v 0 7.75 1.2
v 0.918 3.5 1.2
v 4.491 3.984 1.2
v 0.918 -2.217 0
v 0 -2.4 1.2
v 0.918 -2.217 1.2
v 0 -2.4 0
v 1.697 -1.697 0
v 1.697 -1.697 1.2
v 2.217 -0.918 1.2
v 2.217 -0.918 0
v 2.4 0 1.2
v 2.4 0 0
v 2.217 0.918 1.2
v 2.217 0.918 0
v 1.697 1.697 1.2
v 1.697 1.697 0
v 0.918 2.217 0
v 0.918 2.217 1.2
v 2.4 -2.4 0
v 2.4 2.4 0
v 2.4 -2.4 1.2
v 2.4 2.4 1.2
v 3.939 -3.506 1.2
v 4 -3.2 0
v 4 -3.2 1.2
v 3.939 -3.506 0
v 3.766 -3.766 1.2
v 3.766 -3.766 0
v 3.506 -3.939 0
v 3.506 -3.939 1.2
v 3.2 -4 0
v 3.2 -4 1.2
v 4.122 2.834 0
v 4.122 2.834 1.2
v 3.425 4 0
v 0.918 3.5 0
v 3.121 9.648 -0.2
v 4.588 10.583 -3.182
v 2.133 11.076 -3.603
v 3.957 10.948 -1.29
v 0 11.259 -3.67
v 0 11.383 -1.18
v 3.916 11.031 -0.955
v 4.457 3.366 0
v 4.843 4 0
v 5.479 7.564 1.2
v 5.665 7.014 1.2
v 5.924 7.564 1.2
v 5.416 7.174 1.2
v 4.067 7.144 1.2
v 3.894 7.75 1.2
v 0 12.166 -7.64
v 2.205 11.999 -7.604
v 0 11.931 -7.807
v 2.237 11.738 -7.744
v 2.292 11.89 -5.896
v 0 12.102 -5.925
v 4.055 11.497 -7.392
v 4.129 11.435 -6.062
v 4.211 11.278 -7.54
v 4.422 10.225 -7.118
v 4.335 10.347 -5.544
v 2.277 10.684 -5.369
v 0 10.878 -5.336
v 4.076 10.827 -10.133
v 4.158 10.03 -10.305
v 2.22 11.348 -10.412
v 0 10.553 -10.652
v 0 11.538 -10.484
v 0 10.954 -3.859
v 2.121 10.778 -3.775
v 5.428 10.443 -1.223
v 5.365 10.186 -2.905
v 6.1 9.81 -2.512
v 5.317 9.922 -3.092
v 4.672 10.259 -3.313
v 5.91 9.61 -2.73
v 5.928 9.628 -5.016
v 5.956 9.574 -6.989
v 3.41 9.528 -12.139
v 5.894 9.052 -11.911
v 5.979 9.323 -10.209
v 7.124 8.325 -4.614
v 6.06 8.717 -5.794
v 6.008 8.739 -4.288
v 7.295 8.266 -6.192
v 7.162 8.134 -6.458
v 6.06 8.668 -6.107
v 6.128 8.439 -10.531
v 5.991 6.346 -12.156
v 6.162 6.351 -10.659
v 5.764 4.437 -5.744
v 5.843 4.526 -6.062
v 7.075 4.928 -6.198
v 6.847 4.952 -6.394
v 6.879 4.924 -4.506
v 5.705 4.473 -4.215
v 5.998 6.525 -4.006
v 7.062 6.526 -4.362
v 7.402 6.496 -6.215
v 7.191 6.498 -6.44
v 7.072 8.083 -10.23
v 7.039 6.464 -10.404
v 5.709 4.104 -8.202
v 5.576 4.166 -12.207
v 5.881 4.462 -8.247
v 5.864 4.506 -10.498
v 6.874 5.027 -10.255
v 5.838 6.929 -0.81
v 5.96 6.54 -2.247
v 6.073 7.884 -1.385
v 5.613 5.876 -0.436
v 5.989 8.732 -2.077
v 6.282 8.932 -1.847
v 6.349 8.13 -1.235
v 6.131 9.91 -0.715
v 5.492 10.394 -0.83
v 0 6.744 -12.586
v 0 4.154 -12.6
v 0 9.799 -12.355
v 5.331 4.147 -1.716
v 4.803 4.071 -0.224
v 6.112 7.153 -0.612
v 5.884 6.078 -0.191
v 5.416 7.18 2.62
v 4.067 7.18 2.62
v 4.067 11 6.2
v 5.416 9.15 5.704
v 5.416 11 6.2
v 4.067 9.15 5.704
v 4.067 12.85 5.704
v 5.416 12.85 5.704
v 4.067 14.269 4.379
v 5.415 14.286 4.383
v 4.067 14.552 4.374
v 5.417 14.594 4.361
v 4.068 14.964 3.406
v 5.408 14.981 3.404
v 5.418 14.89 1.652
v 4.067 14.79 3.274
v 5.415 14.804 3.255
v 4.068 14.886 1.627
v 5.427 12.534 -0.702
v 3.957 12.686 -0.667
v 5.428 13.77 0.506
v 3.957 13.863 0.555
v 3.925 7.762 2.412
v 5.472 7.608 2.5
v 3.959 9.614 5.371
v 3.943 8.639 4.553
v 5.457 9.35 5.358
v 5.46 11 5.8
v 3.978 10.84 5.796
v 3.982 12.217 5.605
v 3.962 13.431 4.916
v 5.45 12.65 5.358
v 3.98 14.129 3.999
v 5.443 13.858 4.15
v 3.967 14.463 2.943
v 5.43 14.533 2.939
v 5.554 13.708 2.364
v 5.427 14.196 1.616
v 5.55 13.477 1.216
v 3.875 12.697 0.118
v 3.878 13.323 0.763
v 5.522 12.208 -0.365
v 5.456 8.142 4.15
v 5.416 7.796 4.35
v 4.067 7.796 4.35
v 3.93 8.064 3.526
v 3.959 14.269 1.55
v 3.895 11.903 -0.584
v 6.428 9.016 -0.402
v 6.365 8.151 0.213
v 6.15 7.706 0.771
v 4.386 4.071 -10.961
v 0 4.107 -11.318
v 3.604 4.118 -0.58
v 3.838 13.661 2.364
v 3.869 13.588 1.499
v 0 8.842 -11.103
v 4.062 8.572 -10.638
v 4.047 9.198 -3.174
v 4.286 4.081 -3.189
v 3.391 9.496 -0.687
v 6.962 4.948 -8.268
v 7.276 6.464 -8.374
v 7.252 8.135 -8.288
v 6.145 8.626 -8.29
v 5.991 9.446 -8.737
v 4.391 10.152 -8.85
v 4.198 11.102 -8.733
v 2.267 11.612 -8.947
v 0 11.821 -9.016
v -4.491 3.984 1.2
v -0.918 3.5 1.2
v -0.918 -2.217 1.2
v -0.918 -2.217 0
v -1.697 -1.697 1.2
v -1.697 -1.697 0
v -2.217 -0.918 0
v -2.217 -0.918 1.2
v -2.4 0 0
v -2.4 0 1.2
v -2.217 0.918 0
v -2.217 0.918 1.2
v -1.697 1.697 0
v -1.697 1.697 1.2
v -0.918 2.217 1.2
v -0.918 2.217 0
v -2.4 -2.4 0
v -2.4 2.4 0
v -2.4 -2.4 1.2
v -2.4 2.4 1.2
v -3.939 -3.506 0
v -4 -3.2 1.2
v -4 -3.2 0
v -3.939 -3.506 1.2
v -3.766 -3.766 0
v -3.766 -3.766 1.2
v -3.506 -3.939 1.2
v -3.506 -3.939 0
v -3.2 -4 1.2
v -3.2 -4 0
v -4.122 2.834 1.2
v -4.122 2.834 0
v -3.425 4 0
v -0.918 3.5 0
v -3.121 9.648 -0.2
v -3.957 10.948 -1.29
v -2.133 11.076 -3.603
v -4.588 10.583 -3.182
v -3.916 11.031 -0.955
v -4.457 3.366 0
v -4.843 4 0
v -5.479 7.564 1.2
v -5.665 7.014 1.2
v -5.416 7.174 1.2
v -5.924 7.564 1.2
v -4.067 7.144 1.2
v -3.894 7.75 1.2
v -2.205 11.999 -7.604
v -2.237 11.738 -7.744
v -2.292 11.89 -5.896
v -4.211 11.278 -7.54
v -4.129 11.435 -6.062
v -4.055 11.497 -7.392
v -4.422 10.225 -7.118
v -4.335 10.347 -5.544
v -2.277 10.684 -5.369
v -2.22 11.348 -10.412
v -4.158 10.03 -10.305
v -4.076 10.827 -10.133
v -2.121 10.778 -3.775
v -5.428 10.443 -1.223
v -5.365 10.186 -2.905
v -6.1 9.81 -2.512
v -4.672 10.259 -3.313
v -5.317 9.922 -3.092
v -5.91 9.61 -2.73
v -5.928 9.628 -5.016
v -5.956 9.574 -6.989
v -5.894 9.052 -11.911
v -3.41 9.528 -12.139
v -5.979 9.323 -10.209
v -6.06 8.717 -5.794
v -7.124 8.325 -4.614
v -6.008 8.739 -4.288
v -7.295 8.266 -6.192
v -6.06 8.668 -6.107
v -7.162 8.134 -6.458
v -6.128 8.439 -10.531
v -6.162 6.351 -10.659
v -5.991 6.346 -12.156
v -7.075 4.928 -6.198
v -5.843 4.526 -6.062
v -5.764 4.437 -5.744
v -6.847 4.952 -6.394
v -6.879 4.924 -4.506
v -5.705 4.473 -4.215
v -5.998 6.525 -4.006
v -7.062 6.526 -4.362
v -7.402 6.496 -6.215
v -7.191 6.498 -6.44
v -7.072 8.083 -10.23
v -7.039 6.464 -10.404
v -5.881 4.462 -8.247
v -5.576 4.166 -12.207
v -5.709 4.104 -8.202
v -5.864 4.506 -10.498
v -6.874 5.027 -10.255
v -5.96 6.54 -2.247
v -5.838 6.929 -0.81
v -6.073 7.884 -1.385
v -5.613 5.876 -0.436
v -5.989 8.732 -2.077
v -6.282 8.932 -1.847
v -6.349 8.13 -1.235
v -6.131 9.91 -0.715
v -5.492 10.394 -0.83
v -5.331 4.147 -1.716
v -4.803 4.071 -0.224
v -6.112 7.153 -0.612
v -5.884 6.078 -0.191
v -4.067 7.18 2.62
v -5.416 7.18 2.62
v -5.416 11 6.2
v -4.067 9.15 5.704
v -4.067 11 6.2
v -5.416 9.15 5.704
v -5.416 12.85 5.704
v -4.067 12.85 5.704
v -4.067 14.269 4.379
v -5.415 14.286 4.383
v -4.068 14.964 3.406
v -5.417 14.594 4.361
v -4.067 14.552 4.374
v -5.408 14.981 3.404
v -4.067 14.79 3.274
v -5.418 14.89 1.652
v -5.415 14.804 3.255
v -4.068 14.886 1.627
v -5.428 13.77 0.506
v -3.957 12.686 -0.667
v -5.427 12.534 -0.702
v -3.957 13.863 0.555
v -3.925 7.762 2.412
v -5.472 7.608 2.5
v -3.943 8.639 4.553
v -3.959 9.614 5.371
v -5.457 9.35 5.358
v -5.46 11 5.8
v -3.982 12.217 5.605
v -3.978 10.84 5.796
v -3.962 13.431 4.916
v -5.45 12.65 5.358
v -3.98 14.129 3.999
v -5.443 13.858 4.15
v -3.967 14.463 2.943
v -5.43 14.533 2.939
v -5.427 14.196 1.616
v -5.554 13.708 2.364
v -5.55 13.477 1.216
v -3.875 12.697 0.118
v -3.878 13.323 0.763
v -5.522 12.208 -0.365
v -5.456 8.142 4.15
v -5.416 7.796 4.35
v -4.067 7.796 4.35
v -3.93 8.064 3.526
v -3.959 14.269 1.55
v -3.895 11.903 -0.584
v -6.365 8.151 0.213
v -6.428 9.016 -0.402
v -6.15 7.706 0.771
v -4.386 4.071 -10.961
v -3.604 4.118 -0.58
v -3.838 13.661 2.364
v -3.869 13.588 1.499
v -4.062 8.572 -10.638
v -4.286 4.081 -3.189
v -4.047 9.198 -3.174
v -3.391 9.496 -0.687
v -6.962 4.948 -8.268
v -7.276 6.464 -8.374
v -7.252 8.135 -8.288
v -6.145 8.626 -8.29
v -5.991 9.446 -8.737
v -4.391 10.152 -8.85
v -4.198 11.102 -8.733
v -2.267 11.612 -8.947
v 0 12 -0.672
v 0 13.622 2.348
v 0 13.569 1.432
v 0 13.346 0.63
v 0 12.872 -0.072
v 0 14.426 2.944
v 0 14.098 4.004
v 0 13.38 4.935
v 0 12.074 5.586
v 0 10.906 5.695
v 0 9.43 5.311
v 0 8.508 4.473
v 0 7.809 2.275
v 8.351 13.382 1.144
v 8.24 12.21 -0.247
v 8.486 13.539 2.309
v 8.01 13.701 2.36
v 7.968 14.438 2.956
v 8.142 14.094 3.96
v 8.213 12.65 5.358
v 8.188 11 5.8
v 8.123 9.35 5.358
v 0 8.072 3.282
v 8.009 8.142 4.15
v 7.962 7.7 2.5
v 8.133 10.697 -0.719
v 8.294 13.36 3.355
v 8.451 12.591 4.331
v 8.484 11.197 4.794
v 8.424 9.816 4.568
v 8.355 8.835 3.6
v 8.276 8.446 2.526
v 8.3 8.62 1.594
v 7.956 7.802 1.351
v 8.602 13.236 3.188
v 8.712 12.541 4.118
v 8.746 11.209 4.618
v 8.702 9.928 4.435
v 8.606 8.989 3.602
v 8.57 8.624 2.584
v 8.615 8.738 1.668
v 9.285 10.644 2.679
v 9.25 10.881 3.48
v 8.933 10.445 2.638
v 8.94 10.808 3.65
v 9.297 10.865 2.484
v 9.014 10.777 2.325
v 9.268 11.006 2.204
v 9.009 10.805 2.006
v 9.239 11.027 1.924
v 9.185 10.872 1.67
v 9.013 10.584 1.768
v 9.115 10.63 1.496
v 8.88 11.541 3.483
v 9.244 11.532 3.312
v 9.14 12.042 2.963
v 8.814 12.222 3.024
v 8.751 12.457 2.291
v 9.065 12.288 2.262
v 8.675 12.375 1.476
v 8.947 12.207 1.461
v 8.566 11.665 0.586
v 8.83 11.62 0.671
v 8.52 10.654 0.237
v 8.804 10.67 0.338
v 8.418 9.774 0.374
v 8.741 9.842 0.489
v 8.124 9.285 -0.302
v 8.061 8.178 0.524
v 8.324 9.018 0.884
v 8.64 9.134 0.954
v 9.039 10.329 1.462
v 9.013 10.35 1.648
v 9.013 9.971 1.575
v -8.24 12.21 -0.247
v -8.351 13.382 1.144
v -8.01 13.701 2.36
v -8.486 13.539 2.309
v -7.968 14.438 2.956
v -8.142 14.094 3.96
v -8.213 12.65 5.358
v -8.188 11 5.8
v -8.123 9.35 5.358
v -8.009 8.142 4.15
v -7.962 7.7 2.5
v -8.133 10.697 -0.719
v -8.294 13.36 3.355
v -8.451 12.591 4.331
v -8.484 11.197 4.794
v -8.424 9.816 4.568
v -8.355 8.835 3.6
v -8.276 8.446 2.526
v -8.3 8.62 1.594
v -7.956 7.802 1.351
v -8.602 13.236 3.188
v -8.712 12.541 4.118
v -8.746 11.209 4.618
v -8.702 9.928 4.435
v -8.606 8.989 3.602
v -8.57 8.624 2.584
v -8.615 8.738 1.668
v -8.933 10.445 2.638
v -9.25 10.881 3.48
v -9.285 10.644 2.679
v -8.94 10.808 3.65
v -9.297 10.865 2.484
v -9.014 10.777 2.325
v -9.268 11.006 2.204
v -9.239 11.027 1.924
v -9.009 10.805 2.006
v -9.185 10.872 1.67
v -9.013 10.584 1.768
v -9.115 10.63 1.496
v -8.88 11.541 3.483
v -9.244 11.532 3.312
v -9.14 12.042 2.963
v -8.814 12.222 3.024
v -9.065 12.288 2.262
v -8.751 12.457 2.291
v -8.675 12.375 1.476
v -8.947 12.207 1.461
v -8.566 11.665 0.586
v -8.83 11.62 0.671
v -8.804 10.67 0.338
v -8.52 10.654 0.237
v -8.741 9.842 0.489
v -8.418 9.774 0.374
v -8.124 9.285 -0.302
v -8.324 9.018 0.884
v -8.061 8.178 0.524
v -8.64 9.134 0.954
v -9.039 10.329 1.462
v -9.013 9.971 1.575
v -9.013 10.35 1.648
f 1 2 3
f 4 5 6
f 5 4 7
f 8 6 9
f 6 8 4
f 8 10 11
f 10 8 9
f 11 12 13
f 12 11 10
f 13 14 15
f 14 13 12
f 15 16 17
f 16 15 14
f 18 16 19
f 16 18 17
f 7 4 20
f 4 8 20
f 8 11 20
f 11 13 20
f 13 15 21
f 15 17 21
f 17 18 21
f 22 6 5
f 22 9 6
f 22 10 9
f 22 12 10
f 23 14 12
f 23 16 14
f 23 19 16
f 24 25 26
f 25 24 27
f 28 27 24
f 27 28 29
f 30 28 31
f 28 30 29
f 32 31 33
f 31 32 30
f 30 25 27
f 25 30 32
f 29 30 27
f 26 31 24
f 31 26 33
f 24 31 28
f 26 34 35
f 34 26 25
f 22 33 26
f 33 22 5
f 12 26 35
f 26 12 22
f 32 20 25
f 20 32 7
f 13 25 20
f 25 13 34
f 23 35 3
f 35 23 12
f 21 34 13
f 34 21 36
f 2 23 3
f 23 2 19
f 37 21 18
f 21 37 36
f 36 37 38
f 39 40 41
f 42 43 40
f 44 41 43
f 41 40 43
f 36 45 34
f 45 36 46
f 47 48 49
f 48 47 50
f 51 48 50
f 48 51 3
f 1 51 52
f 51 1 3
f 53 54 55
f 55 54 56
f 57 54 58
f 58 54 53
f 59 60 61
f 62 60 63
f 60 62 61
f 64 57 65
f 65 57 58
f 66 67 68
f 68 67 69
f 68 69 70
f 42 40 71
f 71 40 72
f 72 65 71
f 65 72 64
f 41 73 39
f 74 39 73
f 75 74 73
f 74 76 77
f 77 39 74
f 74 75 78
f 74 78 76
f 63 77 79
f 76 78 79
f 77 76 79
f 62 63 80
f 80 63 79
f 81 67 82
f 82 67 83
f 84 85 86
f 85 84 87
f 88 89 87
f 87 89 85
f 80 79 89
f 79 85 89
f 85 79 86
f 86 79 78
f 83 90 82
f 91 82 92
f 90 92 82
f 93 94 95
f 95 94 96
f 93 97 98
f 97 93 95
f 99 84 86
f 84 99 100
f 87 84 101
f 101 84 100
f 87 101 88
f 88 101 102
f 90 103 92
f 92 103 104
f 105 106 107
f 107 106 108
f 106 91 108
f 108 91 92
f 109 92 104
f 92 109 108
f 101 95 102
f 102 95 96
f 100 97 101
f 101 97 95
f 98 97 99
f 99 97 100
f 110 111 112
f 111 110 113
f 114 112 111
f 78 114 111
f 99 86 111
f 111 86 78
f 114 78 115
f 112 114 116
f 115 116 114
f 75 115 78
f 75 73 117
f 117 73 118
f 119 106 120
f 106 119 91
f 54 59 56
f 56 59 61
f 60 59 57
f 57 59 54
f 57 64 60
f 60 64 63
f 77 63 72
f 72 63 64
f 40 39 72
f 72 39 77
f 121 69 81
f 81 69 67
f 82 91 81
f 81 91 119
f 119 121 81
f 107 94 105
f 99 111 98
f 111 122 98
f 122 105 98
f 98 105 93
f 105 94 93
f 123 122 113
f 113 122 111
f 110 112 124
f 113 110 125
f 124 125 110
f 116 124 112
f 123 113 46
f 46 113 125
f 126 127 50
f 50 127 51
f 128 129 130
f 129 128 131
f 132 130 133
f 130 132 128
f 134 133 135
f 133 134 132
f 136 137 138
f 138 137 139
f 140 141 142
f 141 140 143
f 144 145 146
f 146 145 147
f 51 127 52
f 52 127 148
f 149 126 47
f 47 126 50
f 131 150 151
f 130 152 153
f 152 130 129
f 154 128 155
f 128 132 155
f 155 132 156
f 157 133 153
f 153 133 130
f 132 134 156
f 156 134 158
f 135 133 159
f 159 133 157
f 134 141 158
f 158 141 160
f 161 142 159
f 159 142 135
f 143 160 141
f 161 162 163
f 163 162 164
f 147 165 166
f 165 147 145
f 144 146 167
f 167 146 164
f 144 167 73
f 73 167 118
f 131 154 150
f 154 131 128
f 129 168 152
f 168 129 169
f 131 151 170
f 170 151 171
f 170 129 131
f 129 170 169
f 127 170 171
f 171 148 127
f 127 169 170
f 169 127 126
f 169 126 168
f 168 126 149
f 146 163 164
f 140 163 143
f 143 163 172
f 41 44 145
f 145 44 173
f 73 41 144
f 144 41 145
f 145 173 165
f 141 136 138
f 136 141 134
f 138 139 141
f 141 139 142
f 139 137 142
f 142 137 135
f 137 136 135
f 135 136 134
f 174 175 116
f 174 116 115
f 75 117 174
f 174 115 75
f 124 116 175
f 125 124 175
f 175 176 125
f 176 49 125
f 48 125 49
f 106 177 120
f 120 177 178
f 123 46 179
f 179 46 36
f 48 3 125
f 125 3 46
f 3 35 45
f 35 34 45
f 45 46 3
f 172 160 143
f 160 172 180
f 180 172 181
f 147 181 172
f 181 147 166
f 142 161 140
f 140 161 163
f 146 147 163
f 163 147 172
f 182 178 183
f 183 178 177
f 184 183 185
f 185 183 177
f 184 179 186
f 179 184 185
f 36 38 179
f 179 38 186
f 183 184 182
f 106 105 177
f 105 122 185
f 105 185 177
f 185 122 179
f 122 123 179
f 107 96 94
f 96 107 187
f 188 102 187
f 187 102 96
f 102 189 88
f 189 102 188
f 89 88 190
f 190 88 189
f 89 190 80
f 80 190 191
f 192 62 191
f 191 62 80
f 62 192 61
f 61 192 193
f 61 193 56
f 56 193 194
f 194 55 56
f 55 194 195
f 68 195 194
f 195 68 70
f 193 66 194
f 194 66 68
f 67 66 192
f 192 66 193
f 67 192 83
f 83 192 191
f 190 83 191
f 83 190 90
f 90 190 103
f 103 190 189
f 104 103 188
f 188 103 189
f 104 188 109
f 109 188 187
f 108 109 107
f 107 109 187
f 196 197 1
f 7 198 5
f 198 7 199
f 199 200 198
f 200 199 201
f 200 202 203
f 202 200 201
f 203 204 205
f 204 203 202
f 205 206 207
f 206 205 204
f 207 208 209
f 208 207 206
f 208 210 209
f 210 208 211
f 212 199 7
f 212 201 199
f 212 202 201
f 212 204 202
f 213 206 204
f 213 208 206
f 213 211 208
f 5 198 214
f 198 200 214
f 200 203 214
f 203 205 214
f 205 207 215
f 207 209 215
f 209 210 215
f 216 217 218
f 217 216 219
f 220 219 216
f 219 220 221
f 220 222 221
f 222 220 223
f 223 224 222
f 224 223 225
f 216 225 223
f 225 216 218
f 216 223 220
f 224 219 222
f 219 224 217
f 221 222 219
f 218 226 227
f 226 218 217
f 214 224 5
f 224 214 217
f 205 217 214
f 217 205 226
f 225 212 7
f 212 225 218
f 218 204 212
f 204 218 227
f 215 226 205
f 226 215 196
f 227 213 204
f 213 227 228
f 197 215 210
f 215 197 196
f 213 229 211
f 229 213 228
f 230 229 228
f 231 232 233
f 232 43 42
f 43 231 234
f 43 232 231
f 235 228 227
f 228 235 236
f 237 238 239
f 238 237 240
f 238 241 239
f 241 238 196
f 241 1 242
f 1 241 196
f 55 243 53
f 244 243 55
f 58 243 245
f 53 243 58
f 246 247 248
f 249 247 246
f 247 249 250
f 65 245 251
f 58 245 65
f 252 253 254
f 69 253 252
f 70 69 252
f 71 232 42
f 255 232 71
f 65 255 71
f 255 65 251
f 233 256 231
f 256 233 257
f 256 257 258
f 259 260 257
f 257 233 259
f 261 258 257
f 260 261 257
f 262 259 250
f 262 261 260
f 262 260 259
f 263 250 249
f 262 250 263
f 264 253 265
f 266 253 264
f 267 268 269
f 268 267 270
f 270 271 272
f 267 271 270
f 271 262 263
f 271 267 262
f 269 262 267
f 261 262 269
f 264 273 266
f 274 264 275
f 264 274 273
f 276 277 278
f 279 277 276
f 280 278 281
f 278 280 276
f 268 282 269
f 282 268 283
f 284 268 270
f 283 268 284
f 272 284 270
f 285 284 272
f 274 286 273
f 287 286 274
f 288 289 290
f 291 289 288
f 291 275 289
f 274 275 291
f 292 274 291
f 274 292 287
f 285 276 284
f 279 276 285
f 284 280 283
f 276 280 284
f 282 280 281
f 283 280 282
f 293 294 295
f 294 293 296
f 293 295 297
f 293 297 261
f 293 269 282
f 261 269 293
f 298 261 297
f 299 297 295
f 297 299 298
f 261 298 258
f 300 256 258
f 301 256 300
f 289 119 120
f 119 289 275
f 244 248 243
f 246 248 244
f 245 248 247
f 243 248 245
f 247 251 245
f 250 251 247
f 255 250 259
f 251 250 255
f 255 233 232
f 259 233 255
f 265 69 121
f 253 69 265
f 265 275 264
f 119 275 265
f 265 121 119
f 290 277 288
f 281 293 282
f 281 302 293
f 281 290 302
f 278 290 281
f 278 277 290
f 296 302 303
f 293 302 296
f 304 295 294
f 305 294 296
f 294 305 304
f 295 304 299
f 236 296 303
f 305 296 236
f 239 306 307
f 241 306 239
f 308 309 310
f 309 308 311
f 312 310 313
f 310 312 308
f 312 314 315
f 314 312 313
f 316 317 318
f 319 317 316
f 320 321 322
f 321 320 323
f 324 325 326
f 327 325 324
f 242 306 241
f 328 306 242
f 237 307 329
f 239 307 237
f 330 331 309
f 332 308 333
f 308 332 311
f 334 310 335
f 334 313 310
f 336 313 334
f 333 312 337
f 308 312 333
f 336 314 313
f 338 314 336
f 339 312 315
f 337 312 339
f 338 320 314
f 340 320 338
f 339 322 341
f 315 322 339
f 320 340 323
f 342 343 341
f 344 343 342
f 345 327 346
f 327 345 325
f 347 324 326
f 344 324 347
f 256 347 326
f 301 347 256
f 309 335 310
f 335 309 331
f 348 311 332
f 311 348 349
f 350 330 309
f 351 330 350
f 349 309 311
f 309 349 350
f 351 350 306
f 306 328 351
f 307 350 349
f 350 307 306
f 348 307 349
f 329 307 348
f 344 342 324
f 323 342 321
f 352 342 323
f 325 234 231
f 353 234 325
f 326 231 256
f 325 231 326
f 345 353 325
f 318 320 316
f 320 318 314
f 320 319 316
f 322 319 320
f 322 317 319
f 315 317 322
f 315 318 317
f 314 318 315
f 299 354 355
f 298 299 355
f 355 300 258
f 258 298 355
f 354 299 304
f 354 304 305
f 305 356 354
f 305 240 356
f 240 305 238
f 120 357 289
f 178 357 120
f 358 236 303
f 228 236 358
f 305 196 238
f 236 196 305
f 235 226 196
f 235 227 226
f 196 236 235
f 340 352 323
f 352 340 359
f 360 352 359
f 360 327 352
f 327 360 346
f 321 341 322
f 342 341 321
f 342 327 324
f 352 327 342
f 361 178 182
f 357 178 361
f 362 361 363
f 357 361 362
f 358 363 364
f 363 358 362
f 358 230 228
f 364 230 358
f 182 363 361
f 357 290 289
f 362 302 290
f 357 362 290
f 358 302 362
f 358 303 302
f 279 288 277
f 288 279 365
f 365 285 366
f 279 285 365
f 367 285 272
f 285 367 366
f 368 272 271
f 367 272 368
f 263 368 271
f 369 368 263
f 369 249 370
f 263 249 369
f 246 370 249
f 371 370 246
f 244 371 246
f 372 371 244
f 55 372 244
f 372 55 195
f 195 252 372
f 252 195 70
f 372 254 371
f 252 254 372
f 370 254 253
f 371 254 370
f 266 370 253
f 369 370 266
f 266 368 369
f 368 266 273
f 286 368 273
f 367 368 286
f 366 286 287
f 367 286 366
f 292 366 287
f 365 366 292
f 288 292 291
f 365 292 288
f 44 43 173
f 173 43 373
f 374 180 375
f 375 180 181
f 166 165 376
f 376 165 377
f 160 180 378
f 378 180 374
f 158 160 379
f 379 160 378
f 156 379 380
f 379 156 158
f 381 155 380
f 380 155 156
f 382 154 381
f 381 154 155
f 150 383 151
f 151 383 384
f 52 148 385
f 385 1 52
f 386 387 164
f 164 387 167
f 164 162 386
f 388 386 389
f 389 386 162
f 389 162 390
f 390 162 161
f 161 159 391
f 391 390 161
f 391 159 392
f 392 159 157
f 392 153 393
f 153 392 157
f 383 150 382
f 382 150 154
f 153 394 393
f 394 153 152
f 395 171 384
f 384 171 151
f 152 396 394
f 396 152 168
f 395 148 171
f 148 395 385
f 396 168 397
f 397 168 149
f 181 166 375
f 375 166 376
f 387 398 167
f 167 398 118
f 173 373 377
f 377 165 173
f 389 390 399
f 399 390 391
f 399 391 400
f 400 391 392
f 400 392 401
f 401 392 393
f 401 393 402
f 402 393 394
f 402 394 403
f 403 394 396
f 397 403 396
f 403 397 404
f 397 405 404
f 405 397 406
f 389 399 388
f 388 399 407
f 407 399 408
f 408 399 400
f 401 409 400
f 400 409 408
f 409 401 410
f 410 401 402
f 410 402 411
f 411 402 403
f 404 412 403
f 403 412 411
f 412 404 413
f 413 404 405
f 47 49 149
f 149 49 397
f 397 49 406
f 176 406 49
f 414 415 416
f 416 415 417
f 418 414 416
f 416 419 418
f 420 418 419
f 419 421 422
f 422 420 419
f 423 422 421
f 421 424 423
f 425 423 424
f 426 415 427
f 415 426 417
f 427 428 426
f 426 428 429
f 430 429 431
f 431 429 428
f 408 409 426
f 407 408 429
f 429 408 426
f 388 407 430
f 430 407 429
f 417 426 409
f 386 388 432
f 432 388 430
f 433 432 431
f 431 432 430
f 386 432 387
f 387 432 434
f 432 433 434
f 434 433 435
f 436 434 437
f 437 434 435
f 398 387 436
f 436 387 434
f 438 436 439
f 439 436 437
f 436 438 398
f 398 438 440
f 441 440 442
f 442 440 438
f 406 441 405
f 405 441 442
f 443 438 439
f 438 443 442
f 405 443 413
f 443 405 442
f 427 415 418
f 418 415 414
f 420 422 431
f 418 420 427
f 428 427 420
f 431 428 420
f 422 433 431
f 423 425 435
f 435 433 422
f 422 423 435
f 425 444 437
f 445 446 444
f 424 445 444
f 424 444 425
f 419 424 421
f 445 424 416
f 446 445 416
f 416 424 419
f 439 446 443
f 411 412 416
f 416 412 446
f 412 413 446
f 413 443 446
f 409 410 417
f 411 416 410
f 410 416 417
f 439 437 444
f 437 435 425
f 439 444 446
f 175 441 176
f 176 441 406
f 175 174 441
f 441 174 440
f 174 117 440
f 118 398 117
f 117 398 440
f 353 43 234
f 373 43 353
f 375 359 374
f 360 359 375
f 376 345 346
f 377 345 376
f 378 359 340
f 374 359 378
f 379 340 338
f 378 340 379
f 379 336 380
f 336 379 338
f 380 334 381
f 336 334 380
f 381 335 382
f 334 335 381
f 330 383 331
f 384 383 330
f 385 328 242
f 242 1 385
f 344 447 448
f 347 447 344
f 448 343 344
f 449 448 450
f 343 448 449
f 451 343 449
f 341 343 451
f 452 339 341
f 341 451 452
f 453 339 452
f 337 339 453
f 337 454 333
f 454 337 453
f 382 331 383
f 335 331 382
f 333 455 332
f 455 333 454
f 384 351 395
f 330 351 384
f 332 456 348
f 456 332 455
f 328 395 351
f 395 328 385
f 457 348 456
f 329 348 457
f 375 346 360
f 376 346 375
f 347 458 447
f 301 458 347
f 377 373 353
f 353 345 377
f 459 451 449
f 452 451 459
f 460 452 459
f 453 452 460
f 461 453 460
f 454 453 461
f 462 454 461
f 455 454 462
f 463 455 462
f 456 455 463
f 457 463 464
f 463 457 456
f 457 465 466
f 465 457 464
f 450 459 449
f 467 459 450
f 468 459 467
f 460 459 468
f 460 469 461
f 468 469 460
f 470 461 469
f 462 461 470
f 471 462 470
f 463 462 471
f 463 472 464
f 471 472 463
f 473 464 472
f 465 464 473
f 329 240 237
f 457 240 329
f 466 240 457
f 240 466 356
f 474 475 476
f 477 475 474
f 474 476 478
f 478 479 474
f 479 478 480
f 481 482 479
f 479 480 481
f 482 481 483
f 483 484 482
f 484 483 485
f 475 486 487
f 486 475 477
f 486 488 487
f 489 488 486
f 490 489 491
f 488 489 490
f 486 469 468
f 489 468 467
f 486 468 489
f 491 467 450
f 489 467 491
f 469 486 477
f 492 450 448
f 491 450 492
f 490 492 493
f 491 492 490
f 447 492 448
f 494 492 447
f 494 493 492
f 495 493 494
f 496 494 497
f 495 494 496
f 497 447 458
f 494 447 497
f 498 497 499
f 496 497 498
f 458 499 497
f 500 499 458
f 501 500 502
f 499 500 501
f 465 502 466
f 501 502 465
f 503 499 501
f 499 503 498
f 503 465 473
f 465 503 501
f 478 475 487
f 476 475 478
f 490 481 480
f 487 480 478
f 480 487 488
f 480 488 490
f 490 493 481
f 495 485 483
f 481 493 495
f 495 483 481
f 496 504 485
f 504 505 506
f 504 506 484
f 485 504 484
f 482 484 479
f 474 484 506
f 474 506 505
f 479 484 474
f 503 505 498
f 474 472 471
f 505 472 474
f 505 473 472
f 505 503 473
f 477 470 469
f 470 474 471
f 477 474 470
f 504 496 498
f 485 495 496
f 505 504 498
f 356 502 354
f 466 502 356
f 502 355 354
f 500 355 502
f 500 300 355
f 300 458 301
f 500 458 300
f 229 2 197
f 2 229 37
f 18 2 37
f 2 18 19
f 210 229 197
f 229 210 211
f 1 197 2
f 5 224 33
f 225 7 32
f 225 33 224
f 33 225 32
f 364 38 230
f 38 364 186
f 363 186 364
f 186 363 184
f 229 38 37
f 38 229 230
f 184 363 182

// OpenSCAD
use <../lib.scad>
use <../p/box3u2p.scad>
use <../p/rect2p.scad>
use <s/26073s01.scad>
use <s/26073s02.scad>
$fa=1; $fs=0.2;
function ldraw_lib__26073p03(realsolid=false) = [
// 0 Minifig Backpack with Three Pouches and Dark Green Bedroll Pattern
// 0 Name: 26073p03.dat
// 0 Author: Gerald Lasser [GeraldLasser]
// 0 !LDRAW_ORG Part UPDATE 2022-04
// 0 !LICENSE Licensed under CC BY 2.0 and CC BY 4.0 : see CAreadme.txt
// 
// 0 BFC CERTIFY CCW
  [0,"BFC","CERTIFY"],
  [0,"BFC","CCW"],
// 
// 0 !CATEGORY Minifig Neckwear
// 
// 0 !HISTORY 2022-07-18 [PTadmin] Official Update 2022-04
// 
// 
// 1 16 0 0 0 1 0 0 0 1 0 0 0 1 s\26073s01.dat
  [1,16,0,0,0,1,0,0,0,1,0,0,0,1, ldraw_lib__s__26073s01(realsolid)],
// 1 16 0 0 0 -1 0 0 0 1 0 0 0 1 s\26073s01.dat
  [1,16,0,0,0,-1,0,0,0,1,0,0,0,1, ldraw_lib__s__26073s01(realsolid)],
// 1 288 0 0 0 1 0 0 0 1 0 0 0 1 s\26073s02.dat
  [1,288,0,0,0,1,0,0,0,1,0,0,0,1, ldraw_lib__s__26073s02(realsolid)],
// 1 288 0 0 0 -1 0 0 0 1 0 0 0 1 s\26073s02.dat
  [1,288,0,0,0,-1,0,0,0,1,0,0,0,1, ldraw_lib__s__26073s02(realsolid)],
// 
// 0 BFC INVERTNEXT
  [0,"BFC","INVERTNEXT"],
// 1 16 0 -1.5 5.5434 0 0 2.2962 1.5 0 0 0 3.2066 0 box3u2p.dat
  [1,16,0,-1.5,5.5434,0,0,2.2962,1.5,0,0,0,3.2066,0, ldraw_lib__box3u2p(realsolid)],
// 3 16 0 -3 19.374 -2.2962 -3 8.75 2.2962 -3 8.75
  [3,16,0,-3,19.374,-2.2962,-3,8.75,2.2962,-3,8.75],
// 3 16 0 -3 -6 -8 -3 -10 8 -3 -10
  [3,16,0,-3,-6,-8,-3,-10,8,-3,-10],
// 3 16 -8 0 -10 0 0 -6 8 0 -10
  [3,16,-8,0,-10,0,0,-6,8,0,-10],
// 1 16 0 -1.5 -10 -8 0 0 0 0 1.5 0 1 0 rect2p.dat
  [1,16,0,-1.5,-10,-8,0,0,0,0,1.5,0,1,0, ldraw_lib__rect2p(realsolid)],
// 2 24 7.802 .499 24.119 -7.802 .499 24.119
  [2,24,7.802,.499,24.119,-7.802,.499,24.119],
// 
// 4 16 7.802 .499 24.119 -7.802 .499 24.119 -8.477 1.717 23.739 8.477 1.717 23.739
  [4,16,7.802,.499,24.119,-7.802,.499,24.119,-8.477,1.717,23.739,8.477,1.717,23.739],
// 4 16 10.117 7.934 22.995 8.477 1.717 23.739 -8.477 1.717 23.739 -10.117 7.934 22.995
  [4,16,10.117,7.934,22.995,8.477,1.717,23.739,-8.477,1.717,23.739,-10.117,7.934,22.995],
// 4 16 2.2962 0 8.75 -2.2962 0 8.75 -7.802 .499 24.119 7.802 .499 24.119
  [4,16,2.2962,0,8.75,-2.2962,0,8.75,-7.802,.499,24.119,7.802,.499,24.119],
// 3 16 10.117 7.934 22.995 -10.117 7.934 22.995 0 27.758 22.106
  [3,16,10.117,7.934,22.995,-10.117,7.934,22.995,0,27.758,22.106],
// 5 24 8.477 1.717 23.739 -8.477 1.717 23.739 7.802 .499 24.119 10.117 7.934 22.995
  [5,24,8.477,1.717,23.739,-8.477,1.717,23.739,7.802,.499,24.119,10.117,7.934,22.995],
// 5 24 -10.117 7.934 22.995 10.117 7.934 22.995 8.477 1.717 23.739 10.156 26.595 21.431
  [5,24,-10.117,7.934,22.995,10.117,7.934,22.995,8.477,1.717,23.739,10.156,26.595,21.431],
// 5 24 10.117 7.934 22.995 0 27.758 22.106 10.156 26.595 21.431 -10.117 7.934 22.995
  [5,24,10.117,7.934,22.995,0,27.758,22.106,10.156,26.595,21.431,-10.117,7.934,22.995],
// 5 24 0 27.758 22.106 -10.117 7.934 22.995 10.117 7.934 22.995 -10.156 26.595 21.431
  [5,24,0,27.758,22.106,-10.117,7.934,22.995,10.117,7.934,22.995,-10.156,26.595,21.431],
// 
// 0 // Seam
// 5 24 0 31.466 16.86 0 31.501 10.384 -14.977 30.389 15.864 13.94 30.517 10.414
  [5,24,0,31.466,16.86,0,31.501,10.384,-14.977,30.389,15.864,13.94,30.517,10.414],
// 5 24 0 30.888 24.497 0 31.466 16.86 8.525 30.348 23.819 -8.525 30.348 23.819
  [5,24,0,30.888,24.497,0,31.466,16.86,8.525,30.348,23.819,-8.525,30.348,23.819],
// 5 24 0 26.629 26.383 0 30.888 24.497 8.525 30.348 23.819 -8.525 30.348 23.819
  [5,24,0,26.629,26.383,0,30.888,24.497,8.525,30.348,23.819,-8.525,30.348,23.819],
// 5 24 0 26.629 26.383 0 26.211 28.844 5.549 26.03 28.371 -5.549 26.03 28.371
  [5,24,0,26.629,26.383,0,26.211,28.844,5.549,26.03,28.371,-5.549,26.03,28.371],
// 5 24 0 22.541 29.553 0 26.211 28.844 -5.667 22.367 29.03 5.549 26.03 28.371
  [5,24,0,22.541,29.553,0,26.211,28.844,-5.667,22.367,29.03,5.549,26.03,28.371],
// 5 24 0 22.541 29.553 0 19.518 29.827 -5.667 22.367 29.03 5.592 19.361 29.344
  [5,24,0,22.541,29.553,0,19.518,29.827,-5.667,22.367,29.03,5.592,19.361,29.344],
// 5 24 0 19.518 29.827 0 19.101 30.416 -5.512 19.01 29.997 5.512 19.01 29.997
  [5,24,0,19.518,29.827,0,19.101,30.416,-5.512,19.01,29.997,5.512,19.01,29.997],
// 5 24 0 14.812 30.254 0 19.101 30.416 5.512 19.01 29.997 -5.512 19.01 29.997
  [5,24,0,14.812,30.254,0,19.101,30.416,5.512,19.01,29.997,-5.512,19.01,29.997],
// 5 24 0 13.34 27.194 0 14.812 30.254 5.731 14.739 29.726 -5.731 14.739 29.726
  [5,24,0,13.34,27.194,0,14.812,30.254,5.731,14.739,29.726,-5.731,14.739,29.726],
// 5 24 0 13.34 27.194 0 9.647 27.386 5.303 9.437 26.946 -5.693 13.422 26.709
  [5,24,0,13.34,27.194,0,9.647,27.386,5.303,9.437,26.946,-5.693,13.422,26.709],
// 5 24 0 9.647 27.386 0 9.174 28.147 5.332 9.008 27.69 -5.332 9.008 27.69
  [5,24,0,9.647,27.386,0,9.174,28.147,5.332,9.008,27.69,-5.332,9.008,27.69],
// 5 24 0 9.174 28.147 0 2.95 28.458 -5.332 9.008 27.69 5.332 9.008 27.69
  [5,24,0,9.174,28.147,0,2.95,28.458,-5.332,9.008,27.69,5.332,9.008,27.69],
// 5 24 0 1.68 29.999 0 2.95 28.458 -9.738 1.231 29.578 9.738 1.231 29.578
  [5,24,0,1.68,29.999,0,2.95,28.458,-9.738,1.231,29.578,9.738,1.231,29.578],
// 5 24 0 .179 32.18 0 1.68 29.999 9.687 -.296 31.742 -9.738 1.231 29.578
  [5,24,0,.179,32.18,0,1.68,29.999,9.687,-.296,31.742,-9.738,1.231,29.578],
// 5 24 0 -1.576 33.365 0 .179 32.18 9.687 -.296 31.742 -9.687 -.296 31.742
  [5,24,0,-1.576,33.365,0,.179,32.18,9.687,-.296,31.742,-9.687,-.296,31.742],
// 5 24 0 -3.579 33.922 0 -1.576 33.365 9.696 -1.907 33.307 -9.696 -1.907 33.307
  [5,24,0,-3.579,33.922,0,-1.576,33.365,9.696,-1.907,33.307,-9.696,-1.907,33.307],
// 5 24 0 -3.579 33.922 0 -5.871 34.055 9.594 -5.911 34.153 -9.594 -5.911 34.153
  [5,24,0,-3.579,33.922,0,-5.871,34.055,9.594,-5.911,34.153,-9.594,-5.911,34.153],
// 5 24 0 -5.871 34.055 0 -7.36 36.065 9.594 -5.911 34.153 -9.594 -5.911 34.153
  [5,24,0,-5.871,34.055,0,-7.36,36.065,9.594,-5.911,34.153,-9.594,-5.911,34.153],
// 5 24 0 -10.009 35.245 0 -7.36 36.065 9.918 -7.358 36.157 -9.918 -7.358 36.157
  [5,24,0,-10.009,35.245,0,-7.36,36.065,9.918,-7.358,36.157,-9.918,-7.358,36.157],
// 5 24 0 -12.337 33.451 0 -10.009 35.245 9.904 -12.291 33.578 -9.95 -9.997 35.323
  [5,24,0,-12.337,33.451,0,-10.009,35.245,9.904,-12.291,33.578,-9.95,-9.997,35.323],
// 5 24 0 -13.966 30.184 0 -12.337 33.451 9.956 -14.012 30.543 -9.956 -14.012 30.543
  [5,24,0,-13.966,30.184,0,-12.337,33.451,9.956,-14.012,30.543,-9.956,-14.012,30.543],
// 5 24 0 -14.238 27.264 0 -13.966 30.184 -9.946 -14.489 27.1 9.946 -14.489 27.1
  [5,24,0,-14.238,27.264,0,-13.966,30.184,-9.946,-14.489,27.1,9.946,-14.489,27.1],
// 5 24 0 -5.688 19.523 0 -3 19.374 -9.812 -6.029 19.404 9.735 -3 19.374
  [5,24,0,-5.688,19.523,0,-3,19.374,-9.812,-6.029,19.404,9.735,-3,19.374],
// 5 24 0 -5.688 19.523 0 -8.205 20.18 -9.825 -8.814 20.16 9.812 -6.029 19.404
  [5,24,0,-5.688,19.523,0,-8.205,20.18,-9.825,-8.814,20.16,9.812,-6.029,19.404],
// 5 24 0 -8.205 20.18 0 -11.183 21.269 -9.825 -8.814 20.16 9.825 -8.814 20.16
  [5,24,0,-8.205,20.18,0,-11.183,21.269,-9.825,-8.814,20.16,9.825,-8.814,20.16],
// 5 24 0 -11.183 21.269 0 -13.278 23.574 -9.857 -11.382 21.598 9.857 -11.382 21.598
  [5,24,0,-11.183,21.269,0,-13.278,23.574,-9.857,-11.382,21.598,9.857,-11.382,21.598],
// 5 24 0 -13.278 23.574 0 -14.238 27.264 9.897 -13.428 24.034 -9.897 -13.428 24.034
  [5,24,0,-13.278,23.574,0,-14.238,27.264,9.897,-13.428,24.034,-9.897,-13.428,24.034],
// 5 24 0 28.295 10.267 0 31.501 10.384 10.966 27.403 10.178 -10.966 27.403 10.178
  [5,24,0,28.295,10.267,0,31.501,10.384,10.966,27.403,10.178,-10.966,27.403,10.178],
// 5 24 0 27.758 22.106 0 28.295 10.267 -10.156 26.595 21.431 10.156 26.595 21.431
  [5,24,0,27.758,22.106,0,28.295,10.267,-10.156,26.595,21.431,10.156,26.595,21.431],
// 
// 5 24 -7.802 .499 24.119 -2.2962 0 8.75 -8.563 0 10 7.802 .499 24.119
  [5,24,-7.802,.499,24.119,-2.2962,0,8.75,-8.563,0,10,7.802,.499,24.119],
// 5 24 7.802 .499 24.119 2.2962 0 8.75 -7.802 .499 24.119 8.563 0 10
  [5,24,7.802,.499,24.119,2.2962,0,8.75,-7.802,.499,24.119,8.563,0,10],
];
module ldraw_lib__26073p03(step=0, col=false, unit=2/5, alt=false, line=0.2, solid=!$preview)
    makepoly(ldraw_lib__26073p03(solid), step=step, col=col, unit=unit, alt=alt, line=line, solid=solid);
ldraw_lib__26073p03(line=0.2);
